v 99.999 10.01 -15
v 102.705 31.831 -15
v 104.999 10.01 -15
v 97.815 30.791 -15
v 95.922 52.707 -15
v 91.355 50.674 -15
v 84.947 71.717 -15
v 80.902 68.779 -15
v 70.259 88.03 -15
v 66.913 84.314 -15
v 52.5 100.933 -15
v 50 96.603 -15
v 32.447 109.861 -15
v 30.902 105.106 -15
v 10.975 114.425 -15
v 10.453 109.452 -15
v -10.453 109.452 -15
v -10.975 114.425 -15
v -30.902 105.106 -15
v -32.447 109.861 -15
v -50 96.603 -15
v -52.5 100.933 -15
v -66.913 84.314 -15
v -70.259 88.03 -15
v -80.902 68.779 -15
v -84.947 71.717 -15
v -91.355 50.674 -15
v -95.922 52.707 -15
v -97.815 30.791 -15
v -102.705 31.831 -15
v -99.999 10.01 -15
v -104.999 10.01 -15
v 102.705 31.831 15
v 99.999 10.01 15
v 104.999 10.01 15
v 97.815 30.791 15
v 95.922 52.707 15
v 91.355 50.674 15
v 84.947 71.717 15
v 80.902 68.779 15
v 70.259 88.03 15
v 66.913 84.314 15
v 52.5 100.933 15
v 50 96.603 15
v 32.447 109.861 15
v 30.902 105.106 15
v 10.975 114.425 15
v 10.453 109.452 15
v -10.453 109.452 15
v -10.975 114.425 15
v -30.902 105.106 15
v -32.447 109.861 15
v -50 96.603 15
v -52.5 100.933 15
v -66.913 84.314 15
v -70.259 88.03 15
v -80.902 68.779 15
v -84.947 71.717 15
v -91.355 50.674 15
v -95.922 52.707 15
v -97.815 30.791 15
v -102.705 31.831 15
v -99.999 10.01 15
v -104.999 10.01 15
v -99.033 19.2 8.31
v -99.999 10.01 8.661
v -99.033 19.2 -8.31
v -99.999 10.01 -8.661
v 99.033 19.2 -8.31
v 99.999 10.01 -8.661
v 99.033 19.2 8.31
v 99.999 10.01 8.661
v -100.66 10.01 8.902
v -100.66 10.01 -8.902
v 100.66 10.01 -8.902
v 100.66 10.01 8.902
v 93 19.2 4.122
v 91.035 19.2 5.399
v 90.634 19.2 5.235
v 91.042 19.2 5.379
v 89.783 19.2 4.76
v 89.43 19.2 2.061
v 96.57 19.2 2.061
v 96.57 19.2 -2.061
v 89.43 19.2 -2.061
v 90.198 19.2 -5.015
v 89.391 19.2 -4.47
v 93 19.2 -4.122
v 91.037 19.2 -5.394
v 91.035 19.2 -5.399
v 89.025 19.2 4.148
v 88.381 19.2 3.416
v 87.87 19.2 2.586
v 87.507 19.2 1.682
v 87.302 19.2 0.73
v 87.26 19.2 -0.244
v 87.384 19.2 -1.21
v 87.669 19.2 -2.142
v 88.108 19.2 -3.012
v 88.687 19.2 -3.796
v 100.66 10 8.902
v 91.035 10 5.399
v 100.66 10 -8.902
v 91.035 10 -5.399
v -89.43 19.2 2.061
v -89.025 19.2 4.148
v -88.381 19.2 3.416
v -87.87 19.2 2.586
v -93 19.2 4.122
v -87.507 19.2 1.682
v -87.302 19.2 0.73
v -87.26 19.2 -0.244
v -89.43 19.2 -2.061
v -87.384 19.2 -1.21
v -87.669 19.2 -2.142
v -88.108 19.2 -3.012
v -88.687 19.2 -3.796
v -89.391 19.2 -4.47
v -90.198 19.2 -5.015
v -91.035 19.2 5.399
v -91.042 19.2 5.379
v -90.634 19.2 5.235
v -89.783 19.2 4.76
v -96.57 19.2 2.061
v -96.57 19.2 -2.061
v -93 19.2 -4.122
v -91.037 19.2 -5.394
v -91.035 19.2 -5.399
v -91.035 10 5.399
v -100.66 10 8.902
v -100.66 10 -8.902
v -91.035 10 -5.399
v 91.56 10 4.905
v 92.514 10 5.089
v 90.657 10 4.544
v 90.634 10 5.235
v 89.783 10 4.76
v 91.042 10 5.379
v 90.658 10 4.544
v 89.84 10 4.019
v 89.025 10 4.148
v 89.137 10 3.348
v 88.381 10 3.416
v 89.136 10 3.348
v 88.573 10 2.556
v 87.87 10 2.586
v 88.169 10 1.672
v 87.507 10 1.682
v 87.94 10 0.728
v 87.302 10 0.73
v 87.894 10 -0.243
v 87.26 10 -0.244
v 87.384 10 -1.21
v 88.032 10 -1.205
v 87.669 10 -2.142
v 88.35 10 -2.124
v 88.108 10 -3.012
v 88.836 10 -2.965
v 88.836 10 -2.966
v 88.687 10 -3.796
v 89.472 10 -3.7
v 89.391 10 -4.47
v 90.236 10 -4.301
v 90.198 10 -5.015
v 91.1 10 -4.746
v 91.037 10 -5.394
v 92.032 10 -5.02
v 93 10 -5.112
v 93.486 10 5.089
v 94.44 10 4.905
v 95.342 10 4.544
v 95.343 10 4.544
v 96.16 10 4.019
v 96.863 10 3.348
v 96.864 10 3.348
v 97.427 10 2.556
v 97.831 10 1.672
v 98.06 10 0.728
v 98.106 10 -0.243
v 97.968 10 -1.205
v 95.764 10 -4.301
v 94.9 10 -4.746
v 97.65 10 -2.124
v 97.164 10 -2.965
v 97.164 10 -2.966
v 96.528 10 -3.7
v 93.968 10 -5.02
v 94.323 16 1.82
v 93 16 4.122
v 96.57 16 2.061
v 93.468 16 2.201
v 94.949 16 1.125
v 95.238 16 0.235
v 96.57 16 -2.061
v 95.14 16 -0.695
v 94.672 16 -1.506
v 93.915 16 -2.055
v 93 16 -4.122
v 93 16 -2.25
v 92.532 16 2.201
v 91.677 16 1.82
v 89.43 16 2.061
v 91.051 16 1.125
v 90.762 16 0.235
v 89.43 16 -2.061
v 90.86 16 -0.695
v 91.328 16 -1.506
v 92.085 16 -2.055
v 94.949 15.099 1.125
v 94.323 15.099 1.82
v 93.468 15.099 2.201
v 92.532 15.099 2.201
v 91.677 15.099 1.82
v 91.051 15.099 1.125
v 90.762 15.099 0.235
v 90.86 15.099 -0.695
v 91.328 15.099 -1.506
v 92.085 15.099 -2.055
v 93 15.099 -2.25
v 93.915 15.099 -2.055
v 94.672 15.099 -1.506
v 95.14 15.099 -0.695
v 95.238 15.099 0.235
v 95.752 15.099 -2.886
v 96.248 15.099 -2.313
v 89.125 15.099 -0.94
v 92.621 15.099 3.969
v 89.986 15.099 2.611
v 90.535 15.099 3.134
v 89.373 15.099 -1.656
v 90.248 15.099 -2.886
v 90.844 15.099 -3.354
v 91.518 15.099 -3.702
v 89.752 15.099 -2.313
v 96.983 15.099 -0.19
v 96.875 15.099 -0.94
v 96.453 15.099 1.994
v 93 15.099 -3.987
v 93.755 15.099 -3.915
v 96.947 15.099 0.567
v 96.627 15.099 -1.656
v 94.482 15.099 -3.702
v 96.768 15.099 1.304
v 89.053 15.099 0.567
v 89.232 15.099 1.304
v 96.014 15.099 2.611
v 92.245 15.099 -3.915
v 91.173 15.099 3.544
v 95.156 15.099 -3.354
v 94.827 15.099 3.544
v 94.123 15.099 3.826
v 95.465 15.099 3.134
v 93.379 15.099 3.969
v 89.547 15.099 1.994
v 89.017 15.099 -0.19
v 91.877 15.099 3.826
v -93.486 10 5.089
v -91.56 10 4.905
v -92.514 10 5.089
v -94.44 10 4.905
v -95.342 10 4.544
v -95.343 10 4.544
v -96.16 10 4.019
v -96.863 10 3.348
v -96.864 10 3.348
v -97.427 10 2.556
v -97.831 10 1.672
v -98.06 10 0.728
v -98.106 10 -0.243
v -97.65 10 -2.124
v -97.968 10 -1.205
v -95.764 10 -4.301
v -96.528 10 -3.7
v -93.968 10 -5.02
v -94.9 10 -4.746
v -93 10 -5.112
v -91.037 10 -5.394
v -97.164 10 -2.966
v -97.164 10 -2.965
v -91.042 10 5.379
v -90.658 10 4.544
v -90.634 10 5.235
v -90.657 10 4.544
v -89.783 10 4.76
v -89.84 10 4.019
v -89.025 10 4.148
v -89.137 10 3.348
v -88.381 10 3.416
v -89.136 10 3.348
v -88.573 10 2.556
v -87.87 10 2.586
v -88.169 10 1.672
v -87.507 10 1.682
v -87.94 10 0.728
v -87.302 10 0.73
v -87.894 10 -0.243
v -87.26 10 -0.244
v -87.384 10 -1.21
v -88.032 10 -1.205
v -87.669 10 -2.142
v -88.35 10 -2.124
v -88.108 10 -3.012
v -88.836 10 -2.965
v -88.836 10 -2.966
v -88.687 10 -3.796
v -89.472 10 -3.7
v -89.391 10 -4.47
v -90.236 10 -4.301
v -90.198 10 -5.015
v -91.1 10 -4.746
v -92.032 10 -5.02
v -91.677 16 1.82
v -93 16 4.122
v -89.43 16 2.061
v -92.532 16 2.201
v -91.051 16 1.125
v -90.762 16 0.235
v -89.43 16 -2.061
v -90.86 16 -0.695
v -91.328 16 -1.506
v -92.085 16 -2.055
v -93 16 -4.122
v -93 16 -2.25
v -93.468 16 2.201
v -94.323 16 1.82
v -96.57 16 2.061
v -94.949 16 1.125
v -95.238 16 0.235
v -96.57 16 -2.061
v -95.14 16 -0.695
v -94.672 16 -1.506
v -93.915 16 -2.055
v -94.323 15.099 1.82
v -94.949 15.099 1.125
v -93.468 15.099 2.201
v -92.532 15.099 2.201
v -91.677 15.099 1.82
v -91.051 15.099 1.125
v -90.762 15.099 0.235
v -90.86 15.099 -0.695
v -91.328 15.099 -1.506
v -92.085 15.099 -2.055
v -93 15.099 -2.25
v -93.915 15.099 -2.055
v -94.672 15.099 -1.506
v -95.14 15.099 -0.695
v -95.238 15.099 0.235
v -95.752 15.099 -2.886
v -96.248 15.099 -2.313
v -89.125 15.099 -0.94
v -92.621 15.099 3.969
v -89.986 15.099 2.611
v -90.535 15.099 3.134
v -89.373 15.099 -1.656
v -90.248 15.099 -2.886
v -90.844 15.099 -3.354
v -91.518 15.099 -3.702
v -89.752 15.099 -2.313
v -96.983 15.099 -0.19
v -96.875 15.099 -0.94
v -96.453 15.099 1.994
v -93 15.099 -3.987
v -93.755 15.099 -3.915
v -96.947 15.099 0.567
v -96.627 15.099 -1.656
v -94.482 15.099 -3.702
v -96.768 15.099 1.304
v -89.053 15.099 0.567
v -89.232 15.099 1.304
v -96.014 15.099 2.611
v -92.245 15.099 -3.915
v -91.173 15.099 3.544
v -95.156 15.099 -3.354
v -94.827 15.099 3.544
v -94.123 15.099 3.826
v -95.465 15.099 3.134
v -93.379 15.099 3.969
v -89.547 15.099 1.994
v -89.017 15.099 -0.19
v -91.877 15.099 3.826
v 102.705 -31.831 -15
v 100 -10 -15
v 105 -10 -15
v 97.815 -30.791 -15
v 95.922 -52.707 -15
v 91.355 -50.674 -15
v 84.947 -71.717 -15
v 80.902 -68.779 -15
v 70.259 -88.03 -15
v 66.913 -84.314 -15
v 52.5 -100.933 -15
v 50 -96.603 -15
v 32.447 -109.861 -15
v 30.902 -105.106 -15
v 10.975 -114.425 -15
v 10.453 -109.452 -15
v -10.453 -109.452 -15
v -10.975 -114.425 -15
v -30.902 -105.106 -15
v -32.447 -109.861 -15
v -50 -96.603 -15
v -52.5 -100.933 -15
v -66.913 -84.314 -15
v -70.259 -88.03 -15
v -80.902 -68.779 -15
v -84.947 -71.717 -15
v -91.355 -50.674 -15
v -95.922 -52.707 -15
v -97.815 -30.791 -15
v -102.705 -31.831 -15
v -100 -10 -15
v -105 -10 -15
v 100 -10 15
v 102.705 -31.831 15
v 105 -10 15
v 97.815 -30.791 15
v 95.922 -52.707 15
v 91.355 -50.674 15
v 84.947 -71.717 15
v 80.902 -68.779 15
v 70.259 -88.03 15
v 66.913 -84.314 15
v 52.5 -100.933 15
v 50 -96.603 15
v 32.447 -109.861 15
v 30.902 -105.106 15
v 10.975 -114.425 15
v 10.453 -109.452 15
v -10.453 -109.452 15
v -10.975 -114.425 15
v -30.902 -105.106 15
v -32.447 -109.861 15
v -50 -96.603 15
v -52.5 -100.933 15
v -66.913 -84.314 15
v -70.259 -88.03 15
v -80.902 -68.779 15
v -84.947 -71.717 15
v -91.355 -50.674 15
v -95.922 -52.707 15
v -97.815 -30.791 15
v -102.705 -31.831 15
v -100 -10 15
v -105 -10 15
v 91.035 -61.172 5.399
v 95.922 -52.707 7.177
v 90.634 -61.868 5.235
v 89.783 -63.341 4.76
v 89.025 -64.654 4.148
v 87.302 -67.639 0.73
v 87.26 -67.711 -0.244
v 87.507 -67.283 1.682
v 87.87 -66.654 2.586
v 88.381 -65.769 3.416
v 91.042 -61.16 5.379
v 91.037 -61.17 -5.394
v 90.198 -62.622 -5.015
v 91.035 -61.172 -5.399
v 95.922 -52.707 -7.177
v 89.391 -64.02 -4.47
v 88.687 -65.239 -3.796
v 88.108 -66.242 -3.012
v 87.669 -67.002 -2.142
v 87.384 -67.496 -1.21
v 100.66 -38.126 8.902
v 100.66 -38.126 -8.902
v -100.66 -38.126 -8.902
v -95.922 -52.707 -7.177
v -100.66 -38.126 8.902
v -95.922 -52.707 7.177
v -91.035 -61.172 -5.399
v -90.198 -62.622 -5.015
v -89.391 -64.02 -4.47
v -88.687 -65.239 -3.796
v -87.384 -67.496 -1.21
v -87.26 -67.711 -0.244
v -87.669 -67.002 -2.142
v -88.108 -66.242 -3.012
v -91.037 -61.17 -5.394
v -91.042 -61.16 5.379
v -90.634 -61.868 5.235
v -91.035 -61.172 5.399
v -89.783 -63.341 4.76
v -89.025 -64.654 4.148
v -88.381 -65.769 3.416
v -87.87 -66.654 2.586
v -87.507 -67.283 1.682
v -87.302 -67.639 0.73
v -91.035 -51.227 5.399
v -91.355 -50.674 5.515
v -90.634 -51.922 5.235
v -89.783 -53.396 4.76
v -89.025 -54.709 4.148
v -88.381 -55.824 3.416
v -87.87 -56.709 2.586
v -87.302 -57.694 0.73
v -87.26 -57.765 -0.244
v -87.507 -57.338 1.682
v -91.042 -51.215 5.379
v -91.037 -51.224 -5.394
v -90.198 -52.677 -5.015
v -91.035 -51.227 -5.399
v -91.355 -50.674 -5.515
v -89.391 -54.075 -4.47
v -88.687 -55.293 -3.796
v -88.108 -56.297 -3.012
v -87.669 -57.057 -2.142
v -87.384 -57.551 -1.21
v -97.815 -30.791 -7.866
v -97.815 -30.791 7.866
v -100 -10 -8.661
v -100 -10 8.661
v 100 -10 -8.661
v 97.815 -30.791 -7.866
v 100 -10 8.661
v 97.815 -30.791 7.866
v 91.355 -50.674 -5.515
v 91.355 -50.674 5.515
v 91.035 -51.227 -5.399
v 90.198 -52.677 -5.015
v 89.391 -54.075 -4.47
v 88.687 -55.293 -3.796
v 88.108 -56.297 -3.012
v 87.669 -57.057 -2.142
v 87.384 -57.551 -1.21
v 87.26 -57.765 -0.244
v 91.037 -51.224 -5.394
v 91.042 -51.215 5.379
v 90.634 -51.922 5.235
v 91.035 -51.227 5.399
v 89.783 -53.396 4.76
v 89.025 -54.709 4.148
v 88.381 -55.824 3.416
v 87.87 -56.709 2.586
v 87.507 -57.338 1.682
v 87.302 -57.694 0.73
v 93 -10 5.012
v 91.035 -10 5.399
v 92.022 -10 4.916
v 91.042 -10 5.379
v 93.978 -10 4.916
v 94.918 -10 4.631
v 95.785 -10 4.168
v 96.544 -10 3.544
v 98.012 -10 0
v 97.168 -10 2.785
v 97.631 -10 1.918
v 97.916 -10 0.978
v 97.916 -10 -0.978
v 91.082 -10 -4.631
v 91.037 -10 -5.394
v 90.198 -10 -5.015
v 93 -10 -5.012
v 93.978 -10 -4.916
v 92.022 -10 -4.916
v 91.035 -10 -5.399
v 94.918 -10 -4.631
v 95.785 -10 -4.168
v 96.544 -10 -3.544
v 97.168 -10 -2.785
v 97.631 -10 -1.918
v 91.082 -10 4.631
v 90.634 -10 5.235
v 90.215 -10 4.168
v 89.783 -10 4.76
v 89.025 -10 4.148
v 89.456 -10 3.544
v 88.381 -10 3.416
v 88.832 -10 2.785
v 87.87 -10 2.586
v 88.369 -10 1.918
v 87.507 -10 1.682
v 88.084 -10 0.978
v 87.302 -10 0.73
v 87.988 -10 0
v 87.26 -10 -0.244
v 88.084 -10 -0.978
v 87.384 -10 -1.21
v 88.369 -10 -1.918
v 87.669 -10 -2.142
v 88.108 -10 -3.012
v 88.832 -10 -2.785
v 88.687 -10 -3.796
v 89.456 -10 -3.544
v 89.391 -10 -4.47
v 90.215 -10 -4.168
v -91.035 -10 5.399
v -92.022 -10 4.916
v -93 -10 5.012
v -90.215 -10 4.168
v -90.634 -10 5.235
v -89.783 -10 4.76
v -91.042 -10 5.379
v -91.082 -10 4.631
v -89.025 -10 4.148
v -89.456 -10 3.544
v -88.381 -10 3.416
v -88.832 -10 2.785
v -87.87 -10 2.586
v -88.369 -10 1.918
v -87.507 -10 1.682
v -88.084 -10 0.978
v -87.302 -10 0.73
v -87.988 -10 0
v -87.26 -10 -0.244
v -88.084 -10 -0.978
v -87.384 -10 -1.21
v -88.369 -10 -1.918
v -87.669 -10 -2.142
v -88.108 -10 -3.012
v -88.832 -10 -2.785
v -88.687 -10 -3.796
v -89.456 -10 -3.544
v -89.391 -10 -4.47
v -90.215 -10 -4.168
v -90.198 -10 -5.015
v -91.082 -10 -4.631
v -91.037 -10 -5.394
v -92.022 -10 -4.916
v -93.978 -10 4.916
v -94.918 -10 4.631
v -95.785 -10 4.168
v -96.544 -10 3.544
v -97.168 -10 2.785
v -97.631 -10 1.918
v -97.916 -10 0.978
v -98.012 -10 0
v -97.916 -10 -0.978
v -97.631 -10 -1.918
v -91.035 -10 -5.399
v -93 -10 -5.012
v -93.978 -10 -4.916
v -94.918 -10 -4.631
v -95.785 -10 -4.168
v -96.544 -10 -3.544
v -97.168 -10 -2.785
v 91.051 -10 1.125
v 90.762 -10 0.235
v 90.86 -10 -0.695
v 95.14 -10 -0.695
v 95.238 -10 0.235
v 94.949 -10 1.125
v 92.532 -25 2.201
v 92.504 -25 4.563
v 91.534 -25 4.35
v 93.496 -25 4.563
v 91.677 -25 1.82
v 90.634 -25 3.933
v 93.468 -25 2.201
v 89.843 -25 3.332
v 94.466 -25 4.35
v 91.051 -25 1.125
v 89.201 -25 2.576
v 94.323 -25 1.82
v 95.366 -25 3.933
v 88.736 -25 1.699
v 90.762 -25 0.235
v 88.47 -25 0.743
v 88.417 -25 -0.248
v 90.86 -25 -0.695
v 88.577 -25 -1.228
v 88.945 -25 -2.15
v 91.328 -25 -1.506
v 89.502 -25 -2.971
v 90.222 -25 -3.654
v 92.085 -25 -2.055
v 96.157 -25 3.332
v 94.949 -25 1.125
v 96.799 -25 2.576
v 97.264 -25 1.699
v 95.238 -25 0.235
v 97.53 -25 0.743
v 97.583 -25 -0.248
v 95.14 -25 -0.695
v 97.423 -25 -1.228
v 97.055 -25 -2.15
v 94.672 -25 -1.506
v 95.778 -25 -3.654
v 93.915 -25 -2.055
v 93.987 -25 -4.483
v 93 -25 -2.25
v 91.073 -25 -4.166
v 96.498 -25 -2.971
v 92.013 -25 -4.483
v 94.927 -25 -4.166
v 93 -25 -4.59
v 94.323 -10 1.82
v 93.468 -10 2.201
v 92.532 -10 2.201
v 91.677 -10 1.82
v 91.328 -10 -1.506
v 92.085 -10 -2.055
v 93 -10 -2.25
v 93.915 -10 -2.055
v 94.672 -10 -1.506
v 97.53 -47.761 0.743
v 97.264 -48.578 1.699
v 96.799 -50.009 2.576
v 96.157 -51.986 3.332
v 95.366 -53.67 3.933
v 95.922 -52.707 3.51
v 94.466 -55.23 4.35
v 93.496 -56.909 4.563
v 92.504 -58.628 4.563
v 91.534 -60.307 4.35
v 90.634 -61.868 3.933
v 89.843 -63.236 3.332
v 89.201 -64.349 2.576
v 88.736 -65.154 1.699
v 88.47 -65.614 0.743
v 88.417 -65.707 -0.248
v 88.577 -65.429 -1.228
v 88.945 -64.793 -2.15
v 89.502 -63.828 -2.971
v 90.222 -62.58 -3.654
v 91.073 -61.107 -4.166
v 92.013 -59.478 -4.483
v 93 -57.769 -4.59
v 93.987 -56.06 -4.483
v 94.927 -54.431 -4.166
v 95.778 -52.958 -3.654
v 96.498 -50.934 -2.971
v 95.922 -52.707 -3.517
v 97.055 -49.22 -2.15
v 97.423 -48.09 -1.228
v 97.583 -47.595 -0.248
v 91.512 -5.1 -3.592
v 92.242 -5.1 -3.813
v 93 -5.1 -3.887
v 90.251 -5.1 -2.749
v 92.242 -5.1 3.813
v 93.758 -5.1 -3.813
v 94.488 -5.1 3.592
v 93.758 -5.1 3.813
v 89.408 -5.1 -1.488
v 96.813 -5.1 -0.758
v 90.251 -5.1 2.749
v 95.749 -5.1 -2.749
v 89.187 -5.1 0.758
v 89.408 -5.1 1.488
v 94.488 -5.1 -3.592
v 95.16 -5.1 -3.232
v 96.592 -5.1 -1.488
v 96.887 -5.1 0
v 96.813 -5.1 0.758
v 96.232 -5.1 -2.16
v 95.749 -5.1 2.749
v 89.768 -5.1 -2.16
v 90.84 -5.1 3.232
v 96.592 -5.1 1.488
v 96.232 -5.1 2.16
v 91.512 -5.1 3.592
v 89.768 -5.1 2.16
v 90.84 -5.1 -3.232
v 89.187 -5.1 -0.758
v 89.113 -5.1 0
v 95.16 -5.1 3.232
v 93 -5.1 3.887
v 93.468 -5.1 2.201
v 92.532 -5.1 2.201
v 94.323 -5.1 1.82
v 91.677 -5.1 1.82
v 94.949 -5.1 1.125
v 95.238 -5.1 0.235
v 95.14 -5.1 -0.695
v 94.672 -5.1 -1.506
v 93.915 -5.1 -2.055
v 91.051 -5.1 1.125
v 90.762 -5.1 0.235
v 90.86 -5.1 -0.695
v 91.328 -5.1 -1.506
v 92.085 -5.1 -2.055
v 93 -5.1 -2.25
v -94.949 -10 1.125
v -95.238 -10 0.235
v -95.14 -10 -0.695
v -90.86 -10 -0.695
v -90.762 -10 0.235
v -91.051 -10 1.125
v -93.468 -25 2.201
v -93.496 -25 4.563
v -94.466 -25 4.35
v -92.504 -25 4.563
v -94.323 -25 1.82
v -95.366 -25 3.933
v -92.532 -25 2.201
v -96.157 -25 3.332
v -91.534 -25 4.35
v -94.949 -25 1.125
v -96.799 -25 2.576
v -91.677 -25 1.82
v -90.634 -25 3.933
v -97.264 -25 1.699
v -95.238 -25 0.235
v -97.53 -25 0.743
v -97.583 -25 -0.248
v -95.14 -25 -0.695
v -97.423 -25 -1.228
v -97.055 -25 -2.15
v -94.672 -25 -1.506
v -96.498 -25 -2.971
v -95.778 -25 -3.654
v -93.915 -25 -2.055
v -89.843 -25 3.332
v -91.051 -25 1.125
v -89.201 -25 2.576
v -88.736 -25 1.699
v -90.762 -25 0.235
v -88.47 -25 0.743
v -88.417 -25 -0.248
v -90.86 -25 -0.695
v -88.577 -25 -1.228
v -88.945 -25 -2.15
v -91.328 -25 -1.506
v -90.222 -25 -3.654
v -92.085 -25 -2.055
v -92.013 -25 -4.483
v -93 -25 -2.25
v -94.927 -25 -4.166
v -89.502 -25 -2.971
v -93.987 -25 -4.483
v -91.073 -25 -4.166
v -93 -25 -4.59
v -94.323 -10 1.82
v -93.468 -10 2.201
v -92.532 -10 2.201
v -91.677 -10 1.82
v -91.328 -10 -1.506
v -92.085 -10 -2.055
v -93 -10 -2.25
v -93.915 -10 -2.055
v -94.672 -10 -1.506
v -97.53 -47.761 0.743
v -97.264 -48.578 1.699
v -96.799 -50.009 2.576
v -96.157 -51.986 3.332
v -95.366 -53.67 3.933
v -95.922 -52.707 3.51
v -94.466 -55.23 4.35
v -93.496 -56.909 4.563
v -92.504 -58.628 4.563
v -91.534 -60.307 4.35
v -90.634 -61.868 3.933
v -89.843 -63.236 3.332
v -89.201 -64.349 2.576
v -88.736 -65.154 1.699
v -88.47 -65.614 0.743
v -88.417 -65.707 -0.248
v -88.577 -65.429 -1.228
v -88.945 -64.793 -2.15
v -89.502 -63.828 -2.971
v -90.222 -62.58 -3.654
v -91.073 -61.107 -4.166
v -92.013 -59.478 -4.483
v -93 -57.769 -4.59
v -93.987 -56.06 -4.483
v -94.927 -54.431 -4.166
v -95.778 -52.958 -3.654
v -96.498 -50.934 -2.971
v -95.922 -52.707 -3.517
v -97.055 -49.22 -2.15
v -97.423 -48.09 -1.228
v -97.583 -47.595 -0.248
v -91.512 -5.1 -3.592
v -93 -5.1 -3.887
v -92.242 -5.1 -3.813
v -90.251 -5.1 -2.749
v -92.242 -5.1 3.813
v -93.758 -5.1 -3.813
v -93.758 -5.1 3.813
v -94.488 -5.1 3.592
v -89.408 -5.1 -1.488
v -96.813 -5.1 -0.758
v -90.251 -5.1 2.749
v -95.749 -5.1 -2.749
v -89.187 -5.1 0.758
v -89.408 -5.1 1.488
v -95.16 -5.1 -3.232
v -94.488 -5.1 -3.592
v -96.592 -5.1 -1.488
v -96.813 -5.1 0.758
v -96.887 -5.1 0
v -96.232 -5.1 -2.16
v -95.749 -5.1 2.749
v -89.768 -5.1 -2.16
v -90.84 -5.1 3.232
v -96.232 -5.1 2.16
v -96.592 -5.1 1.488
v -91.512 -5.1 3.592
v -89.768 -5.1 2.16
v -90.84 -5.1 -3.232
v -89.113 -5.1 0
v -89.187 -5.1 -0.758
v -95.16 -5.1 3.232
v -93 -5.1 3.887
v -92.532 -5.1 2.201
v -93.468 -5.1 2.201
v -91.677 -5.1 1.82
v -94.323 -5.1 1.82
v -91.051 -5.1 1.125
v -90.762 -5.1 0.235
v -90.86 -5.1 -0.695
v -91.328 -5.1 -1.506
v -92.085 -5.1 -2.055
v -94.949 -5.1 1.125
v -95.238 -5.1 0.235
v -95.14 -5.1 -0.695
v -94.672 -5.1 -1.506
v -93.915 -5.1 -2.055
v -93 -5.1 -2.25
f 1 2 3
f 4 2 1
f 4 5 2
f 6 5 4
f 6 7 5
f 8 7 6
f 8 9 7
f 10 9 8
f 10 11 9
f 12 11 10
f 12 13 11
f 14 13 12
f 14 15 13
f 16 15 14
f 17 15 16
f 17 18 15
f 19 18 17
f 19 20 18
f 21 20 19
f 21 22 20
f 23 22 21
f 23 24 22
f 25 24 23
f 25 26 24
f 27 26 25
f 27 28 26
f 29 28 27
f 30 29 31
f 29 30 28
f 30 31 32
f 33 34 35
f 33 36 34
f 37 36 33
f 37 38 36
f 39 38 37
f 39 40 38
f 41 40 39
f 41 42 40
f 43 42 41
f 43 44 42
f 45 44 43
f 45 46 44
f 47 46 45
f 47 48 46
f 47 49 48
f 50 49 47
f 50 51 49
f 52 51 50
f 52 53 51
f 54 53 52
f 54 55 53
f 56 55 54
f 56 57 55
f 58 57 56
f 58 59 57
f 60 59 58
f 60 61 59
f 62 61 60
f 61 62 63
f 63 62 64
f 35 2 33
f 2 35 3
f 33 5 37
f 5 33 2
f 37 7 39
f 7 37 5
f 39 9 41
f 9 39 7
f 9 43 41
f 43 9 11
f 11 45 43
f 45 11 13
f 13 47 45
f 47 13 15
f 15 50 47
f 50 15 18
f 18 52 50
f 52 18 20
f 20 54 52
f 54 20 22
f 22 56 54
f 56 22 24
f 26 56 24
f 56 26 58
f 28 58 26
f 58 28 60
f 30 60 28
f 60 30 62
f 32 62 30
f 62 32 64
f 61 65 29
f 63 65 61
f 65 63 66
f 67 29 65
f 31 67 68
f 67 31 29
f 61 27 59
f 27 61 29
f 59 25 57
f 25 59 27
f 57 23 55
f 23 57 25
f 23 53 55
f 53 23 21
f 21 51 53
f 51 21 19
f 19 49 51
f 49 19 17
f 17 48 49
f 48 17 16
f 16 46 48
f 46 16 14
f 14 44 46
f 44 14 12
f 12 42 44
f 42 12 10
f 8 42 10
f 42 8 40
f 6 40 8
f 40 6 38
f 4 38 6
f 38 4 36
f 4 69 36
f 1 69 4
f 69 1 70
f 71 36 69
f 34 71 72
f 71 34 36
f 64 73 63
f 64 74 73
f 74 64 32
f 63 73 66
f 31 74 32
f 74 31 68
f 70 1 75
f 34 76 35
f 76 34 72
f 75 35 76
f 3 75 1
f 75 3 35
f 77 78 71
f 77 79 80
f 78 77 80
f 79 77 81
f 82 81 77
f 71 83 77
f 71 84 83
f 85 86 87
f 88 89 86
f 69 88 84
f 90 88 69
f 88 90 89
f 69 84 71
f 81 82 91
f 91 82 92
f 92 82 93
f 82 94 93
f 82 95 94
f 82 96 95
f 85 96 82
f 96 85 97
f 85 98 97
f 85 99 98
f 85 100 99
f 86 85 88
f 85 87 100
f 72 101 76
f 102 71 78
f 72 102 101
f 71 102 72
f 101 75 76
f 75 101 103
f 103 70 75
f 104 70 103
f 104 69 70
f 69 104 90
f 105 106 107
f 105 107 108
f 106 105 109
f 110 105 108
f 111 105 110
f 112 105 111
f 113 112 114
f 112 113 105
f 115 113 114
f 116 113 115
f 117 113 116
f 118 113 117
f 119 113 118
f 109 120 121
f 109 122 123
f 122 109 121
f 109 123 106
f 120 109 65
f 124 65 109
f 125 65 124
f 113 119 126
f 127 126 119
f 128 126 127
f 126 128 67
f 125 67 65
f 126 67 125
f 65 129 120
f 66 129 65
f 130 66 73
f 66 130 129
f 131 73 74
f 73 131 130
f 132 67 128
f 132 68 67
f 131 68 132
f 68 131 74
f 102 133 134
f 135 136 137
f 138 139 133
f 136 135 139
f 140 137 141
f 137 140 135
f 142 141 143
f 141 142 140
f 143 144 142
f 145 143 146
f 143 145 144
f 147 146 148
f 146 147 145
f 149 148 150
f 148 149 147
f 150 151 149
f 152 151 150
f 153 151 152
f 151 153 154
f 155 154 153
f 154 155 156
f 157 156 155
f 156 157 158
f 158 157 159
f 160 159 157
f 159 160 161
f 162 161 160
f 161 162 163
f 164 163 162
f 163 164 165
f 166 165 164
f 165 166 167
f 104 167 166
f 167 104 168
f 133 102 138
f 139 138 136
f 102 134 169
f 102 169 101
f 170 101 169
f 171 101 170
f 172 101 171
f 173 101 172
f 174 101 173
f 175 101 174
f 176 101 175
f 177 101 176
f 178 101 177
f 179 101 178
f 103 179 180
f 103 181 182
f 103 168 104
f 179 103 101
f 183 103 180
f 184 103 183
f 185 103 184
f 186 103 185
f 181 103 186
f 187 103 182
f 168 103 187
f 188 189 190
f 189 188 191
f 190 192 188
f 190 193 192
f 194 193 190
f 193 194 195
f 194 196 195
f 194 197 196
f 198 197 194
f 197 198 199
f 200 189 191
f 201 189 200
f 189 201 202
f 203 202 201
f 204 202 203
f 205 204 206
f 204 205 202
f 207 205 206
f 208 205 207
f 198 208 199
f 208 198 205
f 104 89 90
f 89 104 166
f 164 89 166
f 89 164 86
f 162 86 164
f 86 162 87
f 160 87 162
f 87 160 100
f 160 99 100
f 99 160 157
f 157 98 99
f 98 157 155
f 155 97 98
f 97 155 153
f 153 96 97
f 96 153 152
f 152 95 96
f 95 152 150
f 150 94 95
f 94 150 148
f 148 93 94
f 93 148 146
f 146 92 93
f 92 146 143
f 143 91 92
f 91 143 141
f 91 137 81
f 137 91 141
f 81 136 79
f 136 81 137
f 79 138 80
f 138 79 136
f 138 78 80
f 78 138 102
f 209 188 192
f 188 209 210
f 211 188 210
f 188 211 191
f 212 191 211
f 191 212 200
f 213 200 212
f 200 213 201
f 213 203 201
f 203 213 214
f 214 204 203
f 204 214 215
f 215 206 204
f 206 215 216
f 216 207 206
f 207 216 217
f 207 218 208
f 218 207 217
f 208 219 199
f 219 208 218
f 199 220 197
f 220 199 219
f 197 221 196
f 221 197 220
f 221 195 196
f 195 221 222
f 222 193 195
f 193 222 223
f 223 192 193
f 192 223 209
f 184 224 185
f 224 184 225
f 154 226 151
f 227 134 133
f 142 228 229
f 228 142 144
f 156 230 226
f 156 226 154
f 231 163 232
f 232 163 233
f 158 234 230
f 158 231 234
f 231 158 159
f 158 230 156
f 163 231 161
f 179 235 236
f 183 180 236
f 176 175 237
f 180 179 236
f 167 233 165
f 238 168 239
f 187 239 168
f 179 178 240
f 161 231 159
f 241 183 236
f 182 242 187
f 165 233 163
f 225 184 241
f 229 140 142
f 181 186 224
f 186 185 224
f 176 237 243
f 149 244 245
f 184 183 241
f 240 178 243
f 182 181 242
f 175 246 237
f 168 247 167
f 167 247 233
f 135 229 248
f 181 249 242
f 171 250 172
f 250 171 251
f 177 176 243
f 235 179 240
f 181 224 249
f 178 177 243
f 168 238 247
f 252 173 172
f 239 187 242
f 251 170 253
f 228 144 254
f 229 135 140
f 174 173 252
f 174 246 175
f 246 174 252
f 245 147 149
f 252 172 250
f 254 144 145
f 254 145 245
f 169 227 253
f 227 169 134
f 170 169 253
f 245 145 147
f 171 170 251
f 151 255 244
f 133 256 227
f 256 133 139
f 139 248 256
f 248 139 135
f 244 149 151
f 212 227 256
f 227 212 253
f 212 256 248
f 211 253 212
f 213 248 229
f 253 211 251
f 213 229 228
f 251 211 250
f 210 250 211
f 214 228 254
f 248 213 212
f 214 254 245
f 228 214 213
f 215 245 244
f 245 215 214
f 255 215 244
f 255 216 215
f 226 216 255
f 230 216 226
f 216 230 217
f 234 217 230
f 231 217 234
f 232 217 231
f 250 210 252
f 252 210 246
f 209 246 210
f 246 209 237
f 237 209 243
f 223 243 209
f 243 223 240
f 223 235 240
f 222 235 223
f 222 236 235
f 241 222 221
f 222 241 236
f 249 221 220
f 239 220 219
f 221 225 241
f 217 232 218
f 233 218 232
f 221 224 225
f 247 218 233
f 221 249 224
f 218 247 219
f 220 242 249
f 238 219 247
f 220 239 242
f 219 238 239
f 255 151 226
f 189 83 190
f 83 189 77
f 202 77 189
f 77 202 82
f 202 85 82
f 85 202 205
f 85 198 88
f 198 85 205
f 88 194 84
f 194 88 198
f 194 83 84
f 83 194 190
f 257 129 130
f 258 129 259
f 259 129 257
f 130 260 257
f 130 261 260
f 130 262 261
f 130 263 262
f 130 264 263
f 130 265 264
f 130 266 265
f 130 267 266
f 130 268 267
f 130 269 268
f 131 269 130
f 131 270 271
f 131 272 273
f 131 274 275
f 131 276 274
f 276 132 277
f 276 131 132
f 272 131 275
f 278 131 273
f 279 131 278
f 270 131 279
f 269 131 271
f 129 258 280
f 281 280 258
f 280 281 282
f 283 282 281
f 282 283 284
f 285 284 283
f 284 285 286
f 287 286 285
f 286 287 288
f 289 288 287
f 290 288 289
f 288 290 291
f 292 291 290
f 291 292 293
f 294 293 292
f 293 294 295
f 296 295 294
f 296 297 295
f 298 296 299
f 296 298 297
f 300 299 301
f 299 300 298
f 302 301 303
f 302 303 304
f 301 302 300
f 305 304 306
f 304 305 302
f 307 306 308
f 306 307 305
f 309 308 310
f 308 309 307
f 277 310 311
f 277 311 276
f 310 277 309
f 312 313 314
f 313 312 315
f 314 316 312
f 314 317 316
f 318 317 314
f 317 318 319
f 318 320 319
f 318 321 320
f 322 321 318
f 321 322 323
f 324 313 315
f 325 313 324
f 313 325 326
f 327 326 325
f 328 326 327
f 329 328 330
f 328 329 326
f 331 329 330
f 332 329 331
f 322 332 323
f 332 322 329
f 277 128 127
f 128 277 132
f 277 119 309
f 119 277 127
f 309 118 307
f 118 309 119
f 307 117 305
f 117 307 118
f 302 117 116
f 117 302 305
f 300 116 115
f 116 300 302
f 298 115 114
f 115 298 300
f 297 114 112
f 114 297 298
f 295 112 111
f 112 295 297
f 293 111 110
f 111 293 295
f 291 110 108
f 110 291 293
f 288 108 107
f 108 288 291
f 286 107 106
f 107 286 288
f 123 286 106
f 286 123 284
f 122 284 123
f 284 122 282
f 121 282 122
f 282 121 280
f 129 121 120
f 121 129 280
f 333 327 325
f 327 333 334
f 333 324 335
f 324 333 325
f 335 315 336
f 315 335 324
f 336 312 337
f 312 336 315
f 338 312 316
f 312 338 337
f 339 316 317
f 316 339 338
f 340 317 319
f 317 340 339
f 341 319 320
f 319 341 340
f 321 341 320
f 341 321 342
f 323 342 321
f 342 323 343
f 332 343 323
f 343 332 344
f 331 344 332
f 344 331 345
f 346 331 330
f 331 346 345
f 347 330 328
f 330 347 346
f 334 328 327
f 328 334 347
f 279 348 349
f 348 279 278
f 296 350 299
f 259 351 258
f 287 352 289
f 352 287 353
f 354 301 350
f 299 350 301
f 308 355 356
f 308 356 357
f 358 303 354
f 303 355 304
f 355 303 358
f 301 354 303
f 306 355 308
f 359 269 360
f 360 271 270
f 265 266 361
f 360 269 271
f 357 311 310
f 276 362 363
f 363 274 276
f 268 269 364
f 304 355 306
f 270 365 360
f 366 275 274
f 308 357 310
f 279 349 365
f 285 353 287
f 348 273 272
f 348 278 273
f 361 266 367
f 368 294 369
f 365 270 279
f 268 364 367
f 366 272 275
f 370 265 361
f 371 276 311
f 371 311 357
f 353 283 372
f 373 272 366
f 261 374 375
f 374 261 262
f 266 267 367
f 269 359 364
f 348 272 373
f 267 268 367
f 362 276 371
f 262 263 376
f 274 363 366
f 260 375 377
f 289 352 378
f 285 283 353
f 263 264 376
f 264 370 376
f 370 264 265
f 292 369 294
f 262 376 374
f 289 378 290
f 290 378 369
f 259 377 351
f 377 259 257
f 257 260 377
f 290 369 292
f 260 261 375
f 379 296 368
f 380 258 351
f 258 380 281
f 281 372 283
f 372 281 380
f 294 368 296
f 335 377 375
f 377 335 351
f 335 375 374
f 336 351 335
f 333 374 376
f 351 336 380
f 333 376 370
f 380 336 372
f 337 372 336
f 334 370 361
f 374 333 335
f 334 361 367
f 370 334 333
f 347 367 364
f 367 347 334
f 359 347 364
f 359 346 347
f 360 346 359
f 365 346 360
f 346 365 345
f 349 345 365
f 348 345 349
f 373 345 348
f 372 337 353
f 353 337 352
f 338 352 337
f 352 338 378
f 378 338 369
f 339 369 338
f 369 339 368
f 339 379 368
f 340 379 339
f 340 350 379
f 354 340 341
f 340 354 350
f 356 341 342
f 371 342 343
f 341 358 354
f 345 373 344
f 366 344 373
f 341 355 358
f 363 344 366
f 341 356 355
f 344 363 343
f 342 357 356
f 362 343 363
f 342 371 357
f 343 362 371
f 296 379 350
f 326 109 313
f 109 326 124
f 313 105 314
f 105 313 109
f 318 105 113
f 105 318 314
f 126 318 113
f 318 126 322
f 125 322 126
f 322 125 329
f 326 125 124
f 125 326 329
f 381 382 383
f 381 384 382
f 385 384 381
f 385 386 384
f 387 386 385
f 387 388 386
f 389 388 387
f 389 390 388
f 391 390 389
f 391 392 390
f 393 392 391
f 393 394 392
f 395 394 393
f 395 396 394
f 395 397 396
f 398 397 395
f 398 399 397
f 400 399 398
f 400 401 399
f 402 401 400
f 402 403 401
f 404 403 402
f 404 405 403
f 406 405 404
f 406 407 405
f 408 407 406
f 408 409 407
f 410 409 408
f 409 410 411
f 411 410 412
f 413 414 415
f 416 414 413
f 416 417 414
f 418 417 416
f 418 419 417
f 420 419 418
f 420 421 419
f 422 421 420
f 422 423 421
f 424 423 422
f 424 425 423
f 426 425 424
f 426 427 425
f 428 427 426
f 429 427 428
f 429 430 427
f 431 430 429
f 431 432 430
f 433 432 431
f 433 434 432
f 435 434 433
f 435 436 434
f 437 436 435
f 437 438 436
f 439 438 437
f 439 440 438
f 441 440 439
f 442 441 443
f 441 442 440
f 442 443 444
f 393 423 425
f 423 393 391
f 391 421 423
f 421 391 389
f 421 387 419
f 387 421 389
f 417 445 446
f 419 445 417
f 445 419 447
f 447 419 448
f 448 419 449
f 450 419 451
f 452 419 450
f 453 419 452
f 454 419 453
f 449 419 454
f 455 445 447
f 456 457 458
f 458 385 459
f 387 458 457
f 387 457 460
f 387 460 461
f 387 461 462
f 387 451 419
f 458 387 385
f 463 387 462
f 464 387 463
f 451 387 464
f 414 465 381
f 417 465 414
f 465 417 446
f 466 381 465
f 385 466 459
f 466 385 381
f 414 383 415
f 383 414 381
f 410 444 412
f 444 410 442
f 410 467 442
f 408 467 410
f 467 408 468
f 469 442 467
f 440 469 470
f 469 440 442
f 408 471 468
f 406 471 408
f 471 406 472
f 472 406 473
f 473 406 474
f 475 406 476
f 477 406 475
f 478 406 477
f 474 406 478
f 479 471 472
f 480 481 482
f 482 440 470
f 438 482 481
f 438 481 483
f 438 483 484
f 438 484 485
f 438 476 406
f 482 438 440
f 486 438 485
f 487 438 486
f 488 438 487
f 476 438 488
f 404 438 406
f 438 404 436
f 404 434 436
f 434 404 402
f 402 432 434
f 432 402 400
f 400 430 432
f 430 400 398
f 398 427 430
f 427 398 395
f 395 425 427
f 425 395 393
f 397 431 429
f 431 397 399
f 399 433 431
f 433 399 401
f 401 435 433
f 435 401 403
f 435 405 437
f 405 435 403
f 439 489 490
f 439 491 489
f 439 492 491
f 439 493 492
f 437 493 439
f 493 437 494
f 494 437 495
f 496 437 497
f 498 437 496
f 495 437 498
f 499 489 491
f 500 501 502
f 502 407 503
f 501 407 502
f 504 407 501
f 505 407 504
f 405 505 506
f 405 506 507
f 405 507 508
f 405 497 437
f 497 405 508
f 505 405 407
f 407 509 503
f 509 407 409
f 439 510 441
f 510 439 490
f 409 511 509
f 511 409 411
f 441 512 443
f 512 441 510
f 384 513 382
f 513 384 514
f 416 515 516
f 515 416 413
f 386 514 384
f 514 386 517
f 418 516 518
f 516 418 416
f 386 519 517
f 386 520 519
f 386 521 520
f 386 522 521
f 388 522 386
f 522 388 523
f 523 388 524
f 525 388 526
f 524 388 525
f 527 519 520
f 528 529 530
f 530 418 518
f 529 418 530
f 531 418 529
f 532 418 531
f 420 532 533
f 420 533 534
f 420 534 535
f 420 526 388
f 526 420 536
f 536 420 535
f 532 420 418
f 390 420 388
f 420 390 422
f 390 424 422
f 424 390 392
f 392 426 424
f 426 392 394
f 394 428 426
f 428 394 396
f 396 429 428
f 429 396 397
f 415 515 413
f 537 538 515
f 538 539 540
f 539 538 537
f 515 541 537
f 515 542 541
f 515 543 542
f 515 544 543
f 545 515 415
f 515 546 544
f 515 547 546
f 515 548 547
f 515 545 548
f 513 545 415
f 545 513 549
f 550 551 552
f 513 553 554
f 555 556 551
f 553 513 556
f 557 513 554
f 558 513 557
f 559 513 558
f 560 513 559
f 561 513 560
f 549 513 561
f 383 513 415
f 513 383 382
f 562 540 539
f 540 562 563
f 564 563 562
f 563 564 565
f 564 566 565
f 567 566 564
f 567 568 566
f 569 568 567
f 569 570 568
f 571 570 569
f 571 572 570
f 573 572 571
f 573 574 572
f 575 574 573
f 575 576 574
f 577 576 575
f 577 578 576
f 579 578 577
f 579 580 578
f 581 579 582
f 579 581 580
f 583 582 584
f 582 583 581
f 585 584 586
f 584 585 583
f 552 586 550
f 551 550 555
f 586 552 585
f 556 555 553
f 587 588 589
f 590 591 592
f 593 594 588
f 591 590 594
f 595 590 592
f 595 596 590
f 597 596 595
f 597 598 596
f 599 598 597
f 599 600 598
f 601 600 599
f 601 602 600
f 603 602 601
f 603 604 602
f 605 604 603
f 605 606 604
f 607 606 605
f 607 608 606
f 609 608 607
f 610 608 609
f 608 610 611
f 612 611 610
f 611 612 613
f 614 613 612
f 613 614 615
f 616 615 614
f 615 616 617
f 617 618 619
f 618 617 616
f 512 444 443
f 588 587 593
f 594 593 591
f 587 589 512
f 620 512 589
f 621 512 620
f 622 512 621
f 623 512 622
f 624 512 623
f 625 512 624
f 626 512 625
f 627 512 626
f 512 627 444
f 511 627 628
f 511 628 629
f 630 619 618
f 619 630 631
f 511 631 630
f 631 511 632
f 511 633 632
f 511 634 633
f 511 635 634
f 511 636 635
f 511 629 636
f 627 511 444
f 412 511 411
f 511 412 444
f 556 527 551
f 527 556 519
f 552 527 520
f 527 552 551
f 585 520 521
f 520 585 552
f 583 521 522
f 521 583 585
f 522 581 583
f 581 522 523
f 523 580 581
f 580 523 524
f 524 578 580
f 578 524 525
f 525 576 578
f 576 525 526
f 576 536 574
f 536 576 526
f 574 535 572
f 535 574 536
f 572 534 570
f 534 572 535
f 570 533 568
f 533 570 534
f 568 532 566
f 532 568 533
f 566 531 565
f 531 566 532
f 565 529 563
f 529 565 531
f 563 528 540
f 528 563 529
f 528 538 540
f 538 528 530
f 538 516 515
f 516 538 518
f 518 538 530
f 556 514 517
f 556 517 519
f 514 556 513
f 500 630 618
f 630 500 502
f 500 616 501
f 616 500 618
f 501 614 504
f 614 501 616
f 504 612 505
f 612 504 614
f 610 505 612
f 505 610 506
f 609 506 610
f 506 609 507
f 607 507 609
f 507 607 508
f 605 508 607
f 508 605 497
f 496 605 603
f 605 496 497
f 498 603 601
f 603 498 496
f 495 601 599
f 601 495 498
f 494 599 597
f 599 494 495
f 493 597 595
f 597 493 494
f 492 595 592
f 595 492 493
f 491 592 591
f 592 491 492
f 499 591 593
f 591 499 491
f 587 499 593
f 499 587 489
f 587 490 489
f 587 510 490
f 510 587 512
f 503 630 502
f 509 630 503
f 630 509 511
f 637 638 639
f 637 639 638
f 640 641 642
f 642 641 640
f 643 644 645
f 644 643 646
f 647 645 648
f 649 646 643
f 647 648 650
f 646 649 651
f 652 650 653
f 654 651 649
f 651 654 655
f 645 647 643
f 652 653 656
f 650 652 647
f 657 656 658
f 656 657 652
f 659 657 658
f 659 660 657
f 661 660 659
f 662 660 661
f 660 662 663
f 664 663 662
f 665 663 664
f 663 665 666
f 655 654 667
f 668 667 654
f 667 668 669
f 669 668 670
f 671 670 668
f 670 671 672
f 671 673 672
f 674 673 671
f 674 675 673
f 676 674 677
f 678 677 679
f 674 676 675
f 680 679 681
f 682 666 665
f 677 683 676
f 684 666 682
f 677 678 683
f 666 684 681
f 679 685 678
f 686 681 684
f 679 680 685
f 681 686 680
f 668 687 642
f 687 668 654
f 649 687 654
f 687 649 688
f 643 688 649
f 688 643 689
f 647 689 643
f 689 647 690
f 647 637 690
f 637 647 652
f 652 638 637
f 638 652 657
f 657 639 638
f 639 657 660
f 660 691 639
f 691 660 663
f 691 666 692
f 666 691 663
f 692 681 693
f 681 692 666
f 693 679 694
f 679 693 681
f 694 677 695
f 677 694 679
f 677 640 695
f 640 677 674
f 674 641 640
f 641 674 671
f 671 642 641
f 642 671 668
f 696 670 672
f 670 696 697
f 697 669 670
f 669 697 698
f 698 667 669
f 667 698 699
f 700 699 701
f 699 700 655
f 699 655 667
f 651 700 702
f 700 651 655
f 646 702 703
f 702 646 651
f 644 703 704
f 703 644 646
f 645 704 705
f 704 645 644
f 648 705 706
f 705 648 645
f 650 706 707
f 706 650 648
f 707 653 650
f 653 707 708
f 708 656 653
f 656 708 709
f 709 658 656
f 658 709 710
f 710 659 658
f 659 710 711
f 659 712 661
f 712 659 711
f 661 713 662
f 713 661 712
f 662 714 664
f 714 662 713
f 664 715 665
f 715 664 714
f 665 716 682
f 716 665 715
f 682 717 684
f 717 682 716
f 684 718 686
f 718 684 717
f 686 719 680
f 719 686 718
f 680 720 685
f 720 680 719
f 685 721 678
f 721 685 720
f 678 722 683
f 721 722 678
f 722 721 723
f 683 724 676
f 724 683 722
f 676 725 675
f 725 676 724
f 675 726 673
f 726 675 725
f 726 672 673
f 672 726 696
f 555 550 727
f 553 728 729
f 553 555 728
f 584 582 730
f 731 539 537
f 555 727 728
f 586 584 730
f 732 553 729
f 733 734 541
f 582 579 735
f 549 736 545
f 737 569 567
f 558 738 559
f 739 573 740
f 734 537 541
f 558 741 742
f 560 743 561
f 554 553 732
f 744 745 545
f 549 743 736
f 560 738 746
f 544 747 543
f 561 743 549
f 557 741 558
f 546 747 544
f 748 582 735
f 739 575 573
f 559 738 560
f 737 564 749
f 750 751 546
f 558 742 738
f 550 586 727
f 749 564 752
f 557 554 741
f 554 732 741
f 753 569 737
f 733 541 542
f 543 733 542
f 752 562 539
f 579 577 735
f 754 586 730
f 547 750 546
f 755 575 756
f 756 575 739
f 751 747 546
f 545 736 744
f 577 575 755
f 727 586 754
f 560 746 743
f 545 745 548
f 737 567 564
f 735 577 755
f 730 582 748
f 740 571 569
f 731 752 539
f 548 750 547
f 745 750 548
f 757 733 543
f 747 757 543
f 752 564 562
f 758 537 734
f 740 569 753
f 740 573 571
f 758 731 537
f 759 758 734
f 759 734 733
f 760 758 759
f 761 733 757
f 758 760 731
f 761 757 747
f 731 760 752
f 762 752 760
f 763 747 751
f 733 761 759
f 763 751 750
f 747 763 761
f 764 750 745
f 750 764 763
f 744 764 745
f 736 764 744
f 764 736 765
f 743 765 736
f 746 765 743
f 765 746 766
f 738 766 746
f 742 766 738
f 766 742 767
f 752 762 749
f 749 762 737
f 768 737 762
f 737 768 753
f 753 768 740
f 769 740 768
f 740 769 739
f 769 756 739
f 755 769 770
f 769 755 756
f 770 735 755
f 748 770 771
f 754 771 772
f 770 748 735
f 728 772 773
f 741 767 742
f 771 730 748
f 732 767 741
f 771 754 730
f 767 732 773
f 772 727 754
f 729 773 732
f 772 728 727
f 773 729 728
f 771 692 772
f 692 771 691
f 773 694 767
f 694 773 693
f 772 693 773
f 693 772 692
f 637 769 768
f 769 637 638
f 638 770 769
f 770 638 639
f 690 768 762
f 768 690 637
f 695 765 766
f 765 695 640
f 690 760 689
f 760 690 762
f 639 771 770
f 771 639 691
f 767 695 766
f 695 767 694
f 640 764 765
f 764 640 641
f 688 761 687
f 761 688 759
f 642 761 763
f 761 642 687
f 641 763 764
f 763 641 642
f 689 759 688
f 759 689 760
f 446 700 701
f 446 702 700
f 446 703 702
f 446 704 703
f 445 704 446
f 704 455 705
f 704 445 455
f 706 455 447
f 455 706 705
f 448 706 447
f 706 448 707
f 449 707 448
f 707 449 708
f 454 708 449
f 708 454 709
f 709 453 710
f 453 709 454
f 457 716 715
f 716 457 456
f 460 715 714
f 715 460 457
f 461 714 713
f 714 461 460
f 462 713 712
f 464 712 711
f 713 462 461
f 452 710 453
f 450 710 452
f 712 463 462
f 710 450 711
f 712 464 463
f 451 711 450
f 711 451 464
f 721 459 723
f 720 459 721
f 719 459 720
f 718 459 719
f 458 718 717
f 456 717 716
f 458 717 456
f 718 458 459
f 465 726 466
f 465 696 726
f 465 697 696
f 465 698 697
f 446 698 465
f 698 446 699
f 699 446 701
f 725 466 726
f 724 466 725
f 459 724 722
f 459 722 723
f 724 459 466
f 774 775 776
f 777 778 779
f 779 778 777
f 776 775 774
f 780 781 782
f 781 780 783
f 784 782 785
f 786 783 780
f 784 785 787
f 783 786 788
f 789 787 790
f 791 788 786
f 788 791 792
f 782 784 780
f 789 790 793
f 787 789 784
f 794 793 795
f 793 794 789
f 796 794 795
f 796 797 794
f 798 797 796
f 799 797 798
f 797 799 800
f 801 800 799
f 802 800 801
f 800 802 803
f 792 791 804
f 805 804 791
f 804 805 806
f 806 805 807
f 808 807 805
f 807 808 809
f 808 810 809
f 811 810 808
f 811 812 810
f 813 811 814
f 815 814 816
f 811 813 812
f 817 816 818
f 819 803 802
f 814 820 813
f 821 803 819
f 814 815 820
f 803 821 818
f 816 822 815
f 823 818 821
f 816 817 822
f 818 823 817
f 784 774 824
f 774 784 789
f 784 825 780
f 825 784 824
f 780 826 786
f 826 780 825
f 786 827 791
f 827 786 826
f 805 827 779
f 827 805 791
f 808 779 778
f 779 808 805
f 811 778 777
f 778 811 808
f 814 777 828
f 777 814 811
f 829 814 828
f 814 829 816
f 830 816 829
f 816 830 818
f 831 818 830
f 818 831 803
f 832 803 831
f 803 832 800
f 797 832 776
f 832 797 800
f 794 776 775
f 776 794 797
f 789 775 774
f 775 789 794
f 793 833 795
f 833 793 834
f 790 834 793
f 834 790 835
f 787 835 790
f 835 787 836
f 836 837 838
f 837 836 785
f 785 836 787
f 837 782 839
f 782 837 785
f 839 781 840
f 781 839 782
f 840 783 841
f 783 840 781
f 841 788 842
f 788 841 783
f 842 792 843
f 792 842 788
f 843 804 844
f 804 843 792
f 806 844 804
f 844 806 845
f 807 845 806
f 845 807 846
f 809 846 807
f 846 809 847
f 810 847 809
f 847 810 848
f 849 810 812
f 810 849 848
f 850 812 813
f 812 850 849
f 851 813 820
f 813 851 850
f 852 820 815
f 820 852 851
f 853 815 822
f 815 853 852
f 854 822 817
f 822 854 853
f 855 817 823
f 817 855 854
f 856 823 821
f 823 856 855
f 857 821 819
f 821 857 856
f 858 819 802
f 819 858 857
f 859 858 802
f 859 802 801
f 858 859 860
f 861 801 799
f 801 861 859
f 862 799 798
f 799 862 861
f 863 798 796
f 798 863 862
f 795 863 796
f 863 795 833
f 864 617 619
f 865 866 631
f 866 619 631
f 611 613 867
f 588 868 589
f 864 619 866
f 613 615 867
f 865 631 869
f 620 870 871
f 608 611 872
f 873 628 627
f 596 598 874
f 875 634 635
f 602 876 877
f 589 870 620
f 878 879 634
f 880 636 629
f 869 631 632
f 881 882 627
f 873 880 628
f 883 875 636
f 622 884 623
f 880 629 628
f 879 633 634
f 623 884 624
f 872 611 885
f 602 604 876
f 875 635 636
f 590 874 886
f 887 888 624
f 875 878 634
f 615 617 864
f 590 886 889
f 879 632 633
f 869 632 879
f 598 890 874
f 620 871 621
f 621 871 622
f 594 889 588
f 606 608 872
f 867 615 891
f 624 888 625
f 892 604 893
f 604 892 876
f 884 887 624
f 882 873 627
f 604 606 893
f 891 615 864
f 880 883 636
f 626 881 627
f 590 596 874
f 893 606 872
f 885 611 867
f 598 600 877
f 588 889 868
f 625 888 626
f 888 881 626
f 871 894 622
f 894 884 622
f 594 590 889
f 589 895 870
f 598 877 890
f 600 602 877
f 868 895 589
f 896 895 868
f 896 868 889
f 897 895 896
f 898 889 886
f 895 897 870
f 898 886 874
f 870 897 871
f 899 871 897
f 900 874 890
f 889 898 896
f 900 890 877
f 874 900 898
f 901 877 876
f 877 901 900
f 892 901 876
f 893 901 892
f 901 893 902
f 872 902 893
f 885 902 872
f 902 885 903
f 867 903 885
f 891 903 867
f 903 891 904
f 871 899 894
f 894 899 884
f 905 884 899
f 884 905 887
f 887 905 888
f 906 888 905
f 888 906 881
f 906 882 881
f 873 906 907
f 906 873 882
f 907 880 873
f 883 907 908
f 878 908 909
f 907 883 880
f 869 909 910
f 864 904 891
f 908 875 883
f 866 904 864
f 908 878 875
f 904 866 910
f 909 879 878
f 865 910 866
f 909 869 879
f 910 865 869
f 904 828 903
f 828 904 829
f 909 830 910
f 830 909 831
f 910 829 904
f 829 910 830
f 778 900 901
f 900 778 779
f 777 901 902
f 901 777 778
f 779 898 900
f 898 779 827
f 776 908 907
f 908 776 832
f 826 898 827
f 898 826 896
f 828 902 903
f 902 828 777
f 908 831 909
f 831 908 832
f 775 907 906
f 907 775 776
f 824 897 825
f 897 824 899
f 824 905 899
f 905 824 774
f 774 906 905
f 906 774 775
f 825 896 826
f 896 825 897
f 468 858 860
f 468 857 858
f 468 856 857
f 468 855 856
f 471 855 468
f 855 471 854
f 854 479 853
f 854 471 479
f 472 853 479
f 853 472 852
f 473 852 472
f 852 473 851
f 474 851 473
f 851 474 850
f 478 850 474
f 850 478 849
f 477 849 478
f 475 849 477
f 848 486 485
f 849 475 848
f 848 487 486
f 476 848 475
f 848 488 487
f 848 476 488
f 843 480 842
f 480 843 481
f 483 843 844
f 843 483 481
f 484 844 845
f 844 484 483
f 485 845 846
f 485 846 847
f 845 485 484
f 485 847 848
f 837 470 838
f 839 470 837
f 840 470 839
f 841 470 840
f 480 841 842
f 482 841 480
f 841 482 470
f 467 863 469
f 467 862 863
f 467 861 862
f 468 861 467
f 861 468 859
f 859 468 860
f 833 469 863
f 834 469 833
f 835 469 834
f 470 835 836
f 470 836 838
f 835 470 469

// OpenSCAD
// file: metric_dimensions.scad
// Dimensions a few metric fasteners.
// Author: James Synge
// Units: mm

////////////////////////////////////////////////////////////////////////////////
// Selected metric screw and nut size info (maximum dimensions), ISO 4032.
// For the washers, using standard DIN 125 / ISO 7089:
//    https://www.engineersedge.com/iso_flat_washer.htm

m4_screw_diam = 4;
m4_hole_diam = 4.5;
m4_nut_diam1 = 7;  // Width across the flats
m4_nut_diam2 = 7.66;  // Width across the corners
m4_nut_height = 3.2;
m4_washer_hole_diam = 4.3;
m4_washer_diam = 9;
m4_washer_thickness = 0.8;

m5_screw_diam = 5;
m5_hole_diam = 5.5;
m5_nut_diam1 = 8;  // Width across the flats
m5_nut_diam2 = 8.79;  // Width across the corners
m5_nut_height = 4.7;


// Given the width across a six sided nut (flat side to flat side),
// how wide is the nut from point to farthest point (i.e. what is the
// diameter of the smallest circle that will enclose the nut).
function hex_short_to_long_diag(d) = d * 2.0 / sqrt(3.0);
// file: misc.scad
include <metric_dimensions.scad>


translate([100,0,0]) motor_cover_shell(50, 40, 30, shell_wall=1,
bracing0=10, bracing1=20
);


color("blue")
translate([0,-10,0]) {
  $fn=20;
  symmetric_z_cylinder(6,20);
}

module symmetric_z_cylinder(d=undef, l=undef, r=undef, convexity=2) {
  assert((d>0 && r==undef) || (d==undef && r>0));
  assert(l!=undef && l>0);
  translate([0,0,-l/2])
    linear_extrude(height=l, convexity=convexity)
      circle(d=d, r=r);
}

module my_cylinder(r=undef, d=undef, r1=undef, r2=undef, h=undef, convexity=undef) {
  assert(r == undef || r1 == undef);
  R = r == undef ? r1 : r;
  assert(R == undef || d == undef);
  scale = (r1 != undef && r2 != undef) ? r2/r1 : 1;
  linear_extrude(height=h, convexity=convexity, scale=scale)
      circle(r=R, d=d);
}

// Helper for creating the hollow box
// around a motor cover. Has 3 sides,
// not counting those due to the non-zero
// thickness of the shell.
// extra_z is below the z=0 plane.
module motor_cover_shell(motor_w, motor_h, motor_z, motor_gap=2, shell_wall=0, shellw=0, shellh=0, shellz=0, extra_z=0, bracing0=0, bracing1=0) {

  shell_w = max(shell_wall, shellw);
  shell_h = max(shell_wall, shellh);
  shell_z = max(shell_wall, shellz);

  assert(shell_w>0);
  assert(shell_z>0);

  inner_w=motor_w + motor_gap*2;
  inner_z=motor_z + motor_gap + extra_z;
  
  outer_w = inner_w + shell_w * 2;
  outer_z = inner_z + shell_z;

  linear_extrude(height=motor_h, convexity=10) {
    translate([-outer_w/2, -extra_z, 0]) {
      difference() {
        square([outer_w, outer_z], center=false);
        translate([shell_w,0,0])
          square([inner_w, inner_z], center=false);
      }
    }
  }
  
  if (bracing0 > 0) {
    // Add some strength at the z=0 plane.
    assert(shell_h>0);
    linear_extrude(height=shell_wall, convexity=10)
      translate([-outer_w/2, motor_z + motor_gap - bracing0, 0]) 
        square([outer_w, bracing0+shell_wall]);
  }

  if (bracing1 > 0) {
    // Add some strength at the z=motor_h plane.
    assert(shell_h>0);
    translate([0,0, motor_h-shell_wall])
      linear_extrude(height=shell_wall, convexity=10)
        translate([-outer_w/2, motor_z + motor_gap - bracing1, 0]) 
          square([outer_w, bracing1+shell_wall]);
  }
}



translate([0, 0, 50]) nut_slot(nut_diam=10, nut_height=5, depth=15, bolt_diam=5, bolt_up=8, bolt_down=16);

module nut_slot(nut_diam=0, nut_height=0, depth=0, bolt_diam=0, bolt_up=0, bolt_down=0, fn=undef) {
  translate([0, 0, -nut_height/2]) {
    rotate([0,0,360/12])
      linear_extrude(height=nut_height)
        circle(d=hex_short_to_long_diag(nut_diam), $fn=6);
    linear_extrude(height=nut_height)
      translate([-nut_diam/2, 0, 0])
        square([nut_diam, depth], center=false);
  
    assert(bolt_diam >= 0);
    assert(bolt_up >= 0);
    assert(bolt_down >= 0);
  
    if (bolt_diam > 0) {
      if (bolt_up > 0) {
        translate([0,0,nut_height])
          linear_extrude(height=bolt_up)
            circle(d=bolt_diam, $fn=fn);
      }
      if (bolt_down > 0) {
        translate([0,0,-bolt_down])
          linear_extrude(height=bolt_down)
            circle(d=bolt_diam, $fn=fn);
      }
    }
  }
}

module nut(nut_hex_diam=undef, screw_diam=undef, nut_height=undef) {
  linear_extrude(height=nut_height) {
    difference() {
      circle(d=hex_short_to_long_diag(nut_hex_diam), $fn=6);
      circle(d=screw_diam, $fn=30);
    }
  }
}

module screw_boss(x, y, z, d, center=false, fn=undef) {
  xlate = center ? [0, 0, -z/2] : [x/2, y/2, 0];
  translate(xlate) {
    linear_extrude(height=z, convexity=10) {
      difference() {
        square([x, y], center=true);
        circle(d=d, $fn=fn);
      }
    }
  }
}
translate([0,0,0]) screw_boss(15,15,10,5, center=true);
translate([0,0,20]) screw_boss(15,15,10,5);

module demo_screw(shaft_diam, shaft_length, head_diam, head_height) {
  color("silver") {
    cylinder(d=head_diam, h=head_height);
    translate([0, 0, head_height])
      cylinder(d=shaft_diam, h=shaft_length);
  }
}

// Space to be occupied by a nut (show_boss=false) or a screw boss (show_boss=true)
// for the corresponding bolt.
module nut_slot_and_screw_boss(show_boss=true, nut_diam=0, nut_height=0, depth=0, bolt_diam=0, bolt_up=0, bolt_down=0, boss_w=0, boss_h=0, boss_z=0, boss_dist=0, fn=undef) {
  // x_offset = (shell2_outside_x + dec2_radius) / 2;
  // y_offset = nut_height+nut_slot_margin;

  if (show_boss) {
    z_dist = boss_dist == 0 ? 0 : (nut_height + boss_z) / 2 + abs(boss_dist);
    z_offset = boss_dist > 0 ? z_dist : -z_dist;
    translate([0, 0, z_offset])
      screw_boss(boss_w, boss_h, boss_z, bolt_diam, center=true, fn=fn);
  } else {
    nut_slot(nut_diam=nut_diam, nut_height=nut_height,
                   depth=depth,
                   bolt_diam=bolt_diam,
                   bolt_up=bolt_up,
                   bolt_down=bolt_down, fn=fn);
  }
}

module test_nut_slot_and_screw_boss(show_boss=true, below=false) {
  boss_dist = below ? -5 : 10;
  nut_slot_and_screw_boss(show_boss=show_boss, nut_diam=10, nut_height=5, depth=15, bolt_diam=5, bolt_up=30, bolt_down=20, boss_w=20, boss_h=12, boss_z=10, boss_dist=boss_dist, fn=20);
}

translate([-50, 0, 0]) {
  test_nut_slot_and_screw_boss(show_boss=true, below=false);
  test_nut_slot_and_screw_boss(show_boss=false, below=false);
  test_nut_slot_and_screw_boss(show_boss=true, below=true);
}

module fillet_outline(radius) {
  intersection() {
    square([radius, radius], center=false);
    translate([radius, radius])
      difference() {
        circle(r=radius*2);
        circle(r=radius);
      };
  }
}

module fillet_extrusion(radius, length, scale=1.0) {
  linear_extrude(height=length, scale=scale)
    fillet_outline(radius);
}
translate([0,-20,0])
fillet_extrusion(5,15,scale=0.5);


module annulus(d1=undef, r1=undef, d2=undef, r2=undef, solid=false) {
  difference() {
    circle(r=r2, d=d2);
    // solid is support for creating solids for CSG operations.
    if (!solid) circle(r=r1, d=d1);
  };
}


module mirrored(v=undef) {
  children();
  mirror(v=v) children();
}

// From OpenSCAD documentation/examples at:
//   https://en.wikibooks.org/wiki/OpenSCAD_User_Manual/Tips_and_Tricks#Filleting_objects
module offset_3d(r=1, size=1e12) {
  n = $fn==undef ? 12: $fn;
  if(r==0) {
    children();
  }  else {
    if( r>0 ) {
      minkowski() {
        children();
        sphere(r, $fn=n);
      }
    } else {
      size2 = size*[1,1,1];
      size1 = size2*0.99;
      difference() {
        cube(size2, center=true);
        minkowski() {
          difference(){
            cube(size1, center=true);
            children();
          }
          sphere(-r, $fn=n);
        }
      }
    }
  }
}
// main file
use <misc.scad>
include <metric_dimensions.scad>
use <paired_bosses.scad>

//echo("cos($t)", cos($t));
distance = 5 * (cos($t*360) + 1);

translate([0, distance, 0]) color("red")
  example(nut_side=true);
translate([0, -distance, 0]) color("green")
  example(nut_side=false);

*translate([0, 0, -40])
  intersection() {
    color("red") example(nut_side=true);
    color("green") example(nut_side=false);
  };

module example(nut_side=true) {
  r1 = 100;
  r2 = 105;
  angle = 20;
  difference() {
    example_body(nut_side=nut_side, r1=r1, r2=r2);
    // Remove from the ring the bosses, which really means removing the holes
    // for the screws.
    mirrored(v=[1,0,0]) {
      matching_rtp_m4_bosses_in_body(nut_side=nut_side, r1=r1, r2=r2, angle=angle, solid=true);
    }
  }
  // The actual bosses.
  mirrored(v=[1,0,0]) {
    matching_rtp_m4_bosses_in_body(nut_side=nut_side, r1=r1, r2=r2, angle=angle, solid=false, do_intersect=true);
  }
}

module example_body(nut_side=undef, r1=undef, r2=undef, solid=false) {
  d2 = r2 * 2;
  translate([0, 0, -15]) {
    if (solid) {
      linear_extrude(height=30, convexity=3)
        circle(r=r2);
    } else {
      intersection() {
        // The whole ring of the helmet.
        linear_extrude(height=30, convexity=3)
          annulus(r1=r1, r2=r2);
        // Cut to be just the upper or lower half (i.e. nut side or screw side).
        if (nut_side) {
          translate([-r2, 0.01, 0])
            cube(size=d2, center=false);
        } else {
          translate([-r2, -d2, 0])
            cube(size=d2, center=false);
        }
      }
    }
  }
}

module matching_rtp_m4_bosses_in_body(nut_side=undef, r1=undef, r2=undef, angle=0, solid=false, do_intersect=false) {
  intersection() {
    matching_rtp_m4_bosses_in_place(nut_side=nut_side, r1=r1, r2=r2, angle=angle, solid=solid);
    if (do_intersect) {
      example_body(nut_side=nut_side, r1=r1, r2=r2, solid=true);
    }
  }
}

module matching_rtp_m4_bosses_in_place(nut_side=undef, r1=undef, r2=undef, angle=0, solid=false) {
  translate([r1-7, 0, 0]) {
    rotate([-90, 0, 0]) {
      rotate([0, 0, 90]) {
        matching_rtp_m4_bosses(nut_side=nut_side, angle=angle, solid=solid);
      }
    }
  }
}

module matching_rtp_m4_bosses(nut_side=undef, angle=0, solid=false) {
  rtp_diam = m4_nut_diam2*1.5;
  rtp_height = m4_nut_diam2;
  matching_m4_recessed_bosses(solid=solid, show_nut_boss=nut_side, show_screw_boss=!nut_side) {
    round_top_pyramid(rtp_diam, rtp_height, angle=angle);
  }
}
